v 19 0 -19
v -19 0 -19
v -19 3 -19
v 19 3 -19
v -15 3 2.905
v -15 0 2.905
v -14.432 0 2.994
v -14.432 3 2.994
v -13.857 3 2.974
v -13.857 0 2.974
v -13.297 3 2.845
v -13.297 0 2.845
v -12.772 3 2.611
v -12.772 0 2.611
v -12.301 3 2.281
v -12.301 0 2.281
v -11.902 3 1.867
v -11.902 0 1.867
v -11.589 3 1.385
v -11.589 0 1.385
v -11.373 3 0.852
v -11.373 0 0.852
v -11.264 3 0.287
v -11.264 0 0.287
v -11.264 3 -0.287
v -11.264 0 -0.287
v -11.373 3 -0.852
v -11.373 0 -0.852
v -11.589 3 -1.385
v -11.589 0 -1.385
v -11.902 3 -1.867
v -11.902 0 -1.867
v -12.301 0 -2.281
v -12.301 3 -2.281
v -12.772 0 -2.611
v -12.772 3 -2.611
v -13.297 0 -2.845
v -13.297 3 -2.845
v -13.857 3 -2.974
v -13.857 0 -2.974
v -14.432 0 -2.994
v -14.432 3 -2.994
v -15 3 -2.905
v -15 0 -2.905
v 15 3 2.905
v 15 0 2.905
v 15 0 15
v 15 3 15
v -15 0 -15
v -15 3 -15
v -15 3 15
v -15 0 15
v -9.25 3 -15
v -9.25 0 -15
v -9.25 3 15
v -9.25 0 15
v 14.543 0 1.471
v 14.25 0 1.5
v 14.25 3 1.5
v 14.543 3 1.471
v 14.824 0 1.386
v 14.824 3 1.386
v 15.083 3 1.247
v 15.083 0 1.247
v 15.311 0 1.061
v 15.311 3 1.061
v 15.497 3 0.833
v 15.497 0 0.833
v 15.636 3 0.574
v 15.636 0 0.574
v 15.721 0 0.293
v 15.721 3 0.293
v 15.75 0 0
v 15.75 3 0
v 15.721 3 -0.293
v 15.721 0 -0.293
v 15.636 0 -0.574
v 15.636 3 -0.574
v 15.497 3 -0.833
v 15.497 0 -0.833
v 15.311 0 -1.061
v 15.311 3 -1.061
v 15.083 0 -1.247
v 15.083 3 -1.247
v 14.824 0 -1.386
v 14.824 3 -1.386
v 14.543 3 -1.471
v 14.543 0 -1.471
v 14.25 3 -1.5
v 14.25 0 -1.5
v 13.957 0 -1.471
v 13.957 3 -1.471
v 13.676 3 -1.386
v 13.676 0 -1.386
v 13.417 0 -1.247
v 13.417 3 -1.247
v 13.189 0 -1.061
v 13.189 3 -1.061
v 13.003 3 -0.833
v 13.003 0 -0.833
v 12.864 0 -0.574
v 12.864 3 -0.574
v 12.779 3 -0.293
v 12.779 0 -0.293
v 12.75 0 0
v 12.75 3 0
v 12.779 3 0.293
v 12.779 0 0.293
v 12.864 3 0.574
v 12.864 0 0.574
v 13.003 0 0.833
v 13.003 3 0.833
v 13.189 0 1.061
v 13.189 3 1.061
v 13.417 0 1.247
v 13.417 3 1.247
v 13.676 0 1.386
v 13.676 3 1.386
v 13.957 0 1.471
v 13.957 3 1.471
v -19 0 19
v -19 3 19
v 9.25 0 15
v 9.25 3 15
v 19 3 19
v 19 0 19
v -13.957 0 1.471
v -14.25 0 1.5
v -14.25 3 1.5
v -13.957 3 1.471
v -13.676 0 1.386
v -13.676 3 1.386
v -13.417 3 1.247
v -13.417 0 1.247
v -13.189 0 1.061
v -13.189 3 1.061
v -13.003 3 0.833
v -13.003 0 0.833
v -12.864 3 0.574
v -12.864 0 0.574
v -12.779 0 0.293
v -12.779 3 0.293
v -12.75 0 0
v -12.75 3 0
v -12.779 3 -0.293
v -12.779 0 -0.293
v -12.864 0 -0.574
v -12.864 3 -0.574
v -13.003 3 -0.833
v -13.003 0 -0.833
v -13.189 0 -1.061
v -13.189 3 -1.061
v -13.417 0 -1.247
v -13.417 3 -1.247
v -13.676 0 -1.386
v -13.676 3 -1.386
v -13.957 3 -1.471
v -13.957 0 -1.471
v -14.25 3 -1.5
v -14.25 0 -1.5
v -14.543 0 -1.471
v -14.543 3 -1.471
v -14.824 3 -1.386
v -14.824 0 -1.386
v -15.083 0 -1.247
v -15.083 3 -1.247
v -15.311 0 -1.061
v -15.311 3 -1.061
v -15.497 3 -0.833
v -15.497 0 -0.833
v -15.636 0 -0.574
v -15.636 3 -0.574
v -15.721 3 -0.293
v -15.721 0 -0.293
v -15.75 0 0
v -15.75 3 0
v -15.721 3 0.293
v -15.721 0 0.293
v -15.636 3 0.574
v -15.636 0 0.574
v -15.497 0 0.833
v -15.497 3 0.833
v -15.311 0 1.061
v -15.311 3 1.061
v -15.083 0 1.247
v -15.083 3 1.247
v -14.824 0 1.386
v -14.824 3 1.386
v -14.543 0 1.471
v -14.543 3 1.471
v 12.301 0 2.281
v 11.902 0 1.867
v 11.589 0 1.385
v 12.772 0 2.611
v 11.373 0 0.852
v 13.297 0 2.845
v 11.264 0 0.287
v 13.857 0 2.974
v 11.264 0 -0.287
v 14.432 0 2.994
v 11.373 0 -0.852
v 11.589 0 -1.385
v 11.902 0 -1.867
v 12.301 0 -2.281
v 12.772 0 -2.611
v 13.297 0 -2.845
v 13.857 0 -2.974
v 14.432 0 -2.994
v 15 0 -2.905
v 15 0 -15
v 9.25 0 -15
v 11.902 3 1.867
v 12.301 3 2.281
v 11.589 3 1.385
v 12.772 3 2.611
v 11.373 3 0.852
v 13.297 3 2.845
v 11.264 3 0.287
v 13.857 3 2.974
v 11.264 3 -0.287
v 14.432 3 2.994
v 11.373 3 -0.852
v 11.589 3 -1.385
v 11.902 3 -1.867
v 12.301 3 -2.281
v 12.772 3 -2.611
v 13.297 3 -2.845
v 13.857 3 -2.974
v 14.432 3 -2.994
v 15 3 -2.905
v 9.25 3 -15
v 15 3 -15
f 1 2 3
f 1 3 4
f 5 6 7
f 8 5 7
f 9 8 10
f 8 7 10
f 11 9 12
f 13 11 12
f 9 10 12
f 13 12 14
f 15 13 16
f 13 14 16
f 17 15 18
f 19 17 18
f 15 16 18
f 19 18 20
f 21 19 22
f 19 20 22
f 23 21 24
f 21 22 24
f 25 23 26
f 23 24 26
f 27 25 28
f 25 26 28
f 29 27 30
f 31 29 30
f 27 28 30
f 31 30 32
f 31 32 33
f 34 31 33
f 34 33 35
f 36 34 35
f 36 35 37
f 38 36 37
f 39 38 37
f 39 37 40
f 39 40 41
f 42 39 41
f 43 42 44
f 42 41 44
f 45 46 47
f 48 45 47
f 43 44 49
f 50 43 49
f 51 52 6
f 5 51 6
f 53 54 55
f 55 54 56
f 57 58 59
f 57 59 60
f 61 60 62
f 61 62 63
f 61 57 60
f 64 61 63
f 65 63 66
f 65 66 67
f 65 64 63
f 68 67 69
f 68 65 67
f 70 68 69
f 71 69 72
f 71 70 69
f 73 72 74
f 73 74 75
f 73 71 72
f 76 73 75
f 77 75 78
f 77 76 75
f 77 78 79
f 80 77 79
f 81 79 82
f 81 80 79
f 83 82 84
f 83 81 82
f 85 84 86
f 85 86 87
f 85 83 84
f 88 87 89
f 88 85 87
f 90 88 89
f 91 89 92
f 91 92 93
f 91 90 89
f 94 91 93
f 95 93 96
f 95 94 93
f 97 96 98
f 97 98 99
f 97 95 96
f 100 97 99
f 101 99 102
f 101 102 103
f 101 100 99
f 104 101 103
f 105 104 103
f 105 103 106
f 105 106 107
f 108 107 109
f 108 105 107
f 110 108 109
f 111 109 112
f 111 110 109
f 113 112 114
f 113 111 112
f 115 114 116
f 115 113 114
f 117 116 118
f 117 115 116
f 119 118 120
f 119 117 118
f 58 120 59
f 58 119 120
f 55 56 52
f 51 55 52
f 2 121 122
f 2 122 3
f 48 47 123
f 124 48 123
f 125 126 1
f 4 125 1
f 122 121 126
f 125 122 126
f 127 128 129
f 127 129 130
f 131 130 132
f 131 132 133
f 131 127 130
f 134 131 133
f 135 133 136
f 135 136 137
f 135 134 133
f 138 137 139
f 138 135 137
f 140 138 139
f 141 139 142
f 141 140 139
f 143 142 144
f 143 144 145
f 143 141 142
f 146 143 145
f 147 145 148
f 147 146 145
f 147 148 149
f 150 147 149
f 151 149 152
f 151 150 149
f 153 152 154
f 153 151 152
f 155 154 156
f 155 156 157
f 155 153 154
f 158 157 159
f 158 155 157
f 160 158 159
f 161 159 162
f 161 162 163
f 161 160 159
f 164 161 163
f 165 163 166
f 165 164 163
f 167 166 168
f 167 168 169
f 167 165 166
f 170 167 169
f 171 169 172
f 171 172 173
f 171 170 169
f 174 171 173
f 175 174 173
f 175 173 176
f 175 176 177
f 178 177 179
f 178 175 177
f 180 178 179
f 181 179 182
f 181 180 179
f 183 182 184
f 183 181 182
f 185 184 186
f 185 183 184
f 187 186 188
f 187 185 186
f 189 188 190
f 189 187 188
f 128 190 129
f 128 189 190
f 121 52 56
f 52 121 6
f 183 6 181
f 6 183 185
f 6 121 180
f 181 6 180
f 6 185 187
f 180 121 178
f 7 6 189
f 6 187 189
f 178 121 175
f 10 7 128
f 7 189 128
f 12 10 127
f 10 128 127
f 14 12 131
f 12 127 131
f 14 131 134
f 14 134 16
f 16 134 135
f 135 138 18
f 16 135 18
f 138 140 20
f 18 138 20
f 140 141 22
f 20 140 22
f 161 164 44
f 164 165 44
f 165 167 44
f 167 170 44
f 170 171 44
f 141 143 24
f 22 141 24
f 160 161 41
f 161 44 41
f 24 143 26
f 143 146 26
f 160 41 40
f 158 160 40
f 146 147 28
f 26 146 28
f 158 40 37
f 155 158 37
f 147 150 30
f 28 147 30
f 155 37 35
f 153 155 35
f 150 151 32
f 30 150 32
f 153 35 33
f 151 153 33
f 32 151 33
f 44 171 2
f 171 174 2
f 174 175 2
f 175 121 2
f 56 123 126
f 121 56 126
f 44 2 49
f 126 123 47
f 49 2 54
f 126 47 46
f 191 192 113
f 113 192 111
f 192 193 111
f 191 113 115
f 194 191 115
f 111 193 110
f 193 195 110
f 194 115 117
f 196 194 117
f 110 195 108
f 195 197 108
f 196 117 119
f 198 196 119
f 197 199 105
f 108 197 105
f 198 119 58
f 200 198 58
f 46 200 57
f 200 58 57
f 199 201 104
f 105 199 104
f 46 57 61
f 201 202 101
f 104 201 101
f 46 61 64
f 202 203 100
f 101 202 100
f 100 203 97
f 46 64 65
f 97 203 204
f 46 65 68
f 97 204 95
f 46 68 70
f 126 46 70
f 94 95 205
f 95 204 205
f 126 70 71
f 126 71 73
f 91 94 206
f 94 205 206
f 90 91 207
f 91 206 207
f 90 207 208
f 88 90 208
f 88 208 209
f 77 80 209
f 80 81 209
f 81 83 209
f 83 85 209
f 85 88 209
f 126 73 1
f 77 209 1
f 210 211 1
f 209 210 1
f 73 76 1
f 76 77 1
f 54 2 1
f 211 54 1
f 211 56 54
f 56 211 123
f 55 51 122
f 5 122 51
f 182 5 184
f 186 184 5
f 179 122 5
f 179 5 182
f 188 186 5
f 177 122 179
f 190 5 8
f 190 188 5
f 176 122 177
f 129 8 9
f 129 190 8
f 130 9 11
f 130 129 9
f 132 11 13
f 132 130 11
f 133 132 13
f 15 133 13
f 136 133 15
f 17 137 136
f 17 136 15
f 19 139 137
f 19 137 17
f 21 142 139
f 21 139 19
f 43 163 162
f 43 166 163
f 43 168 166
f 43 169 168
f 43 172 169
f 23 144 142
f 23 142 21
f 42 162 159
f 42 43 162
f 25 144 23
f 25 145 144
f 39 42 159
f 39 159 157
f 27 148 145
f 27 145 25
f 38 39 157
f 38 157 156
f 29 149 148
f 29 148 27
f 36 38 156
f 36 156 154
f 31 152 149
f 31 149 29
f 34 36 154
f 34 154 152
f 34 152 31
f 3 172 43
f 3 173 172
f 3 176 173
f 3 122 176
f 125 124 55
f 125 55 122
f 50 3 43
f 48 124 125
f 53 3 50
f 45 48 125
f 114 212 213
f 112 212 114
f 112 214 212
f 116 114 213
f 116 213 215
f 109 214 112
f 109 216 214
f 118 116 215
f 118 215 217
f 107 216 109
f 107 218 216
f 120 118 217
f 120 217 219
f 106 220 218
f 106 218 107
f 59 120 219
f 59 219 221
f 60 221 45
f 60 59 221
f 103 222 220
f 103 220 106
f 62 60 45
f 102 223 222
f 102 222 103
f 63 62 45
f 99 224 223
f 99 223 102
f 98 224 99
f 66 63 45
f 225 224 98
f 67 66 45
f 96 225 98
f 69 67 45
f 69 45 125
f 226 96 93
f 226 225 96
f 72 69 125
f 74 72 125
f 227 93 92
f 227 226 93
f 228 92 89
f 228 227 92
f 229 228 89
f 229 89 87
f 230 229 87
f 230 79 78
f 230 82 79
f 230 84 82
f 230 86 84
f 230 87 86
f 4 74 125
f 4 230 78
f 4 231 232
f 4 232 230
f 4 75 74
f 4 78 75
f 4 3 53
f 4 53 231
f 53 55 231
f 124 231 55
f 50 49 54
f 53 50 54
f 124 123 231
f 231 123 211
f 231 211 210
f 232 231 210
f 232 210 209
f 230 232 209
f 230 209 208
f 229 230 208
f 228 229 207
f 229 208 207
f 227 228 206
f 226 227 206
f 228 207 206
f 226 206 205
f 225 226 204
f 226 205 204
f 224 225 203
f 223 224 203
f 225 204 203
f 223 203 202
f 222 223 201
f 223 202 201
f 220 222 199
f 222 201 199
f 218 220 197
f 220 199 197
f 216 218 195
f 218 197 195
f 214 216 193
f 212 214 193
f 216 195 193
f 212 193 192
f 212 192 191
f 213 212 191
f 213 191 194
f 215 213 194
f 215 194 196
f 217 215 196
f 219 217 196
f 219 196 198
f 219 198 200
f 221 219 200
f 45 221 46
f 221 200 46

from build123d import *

# Parameters (mm, degrees)
SKETCH1_W           = 38
SKETCH1_H           = 38
SKETCH1_R           = 1.5
BOSS_EXTRUDE1_DEPTH = 3


with BuildPart() as part:
    # Sketch1 → Boss-Extrude1 (new body)
    with BuildSketch(Plane(origin=(0, 0, 0), x_dir=(1, 0, 0), z_dir=(0, 1, 0))):
        Rectangle(SKETCH1_W, SKETCH1_H)
        with BuildLine():
            ThreePointArc((-15, -2.90473751), (-11.25, 0), (-15, 2.90473751))
            Line((-15, 2.90473751), (-15, 15))
            Line((-15, 15), (-9.25, 15))
            Line((-9.25, 15), (-9.25, -15))
            Line((-9.25, -15), (-15, -15))
            Line((-15, -15), (-15, -2.90473751))
        make_face(mode=Mode.SUBTRACT)
        with Locations(Location((-14.25, 0, 0), (0, 0, 270))):
            Circle(SKETCH1_R, mode=Mode.SUBTRACT)
        with BuildLine():
            Line((15, -15), (9.25, -15))
            Line((9.25, -15), (9.25, 15))
            Line((9.25, 15), (15, 15))
            Line((15, 15), (15, 2.90473751))
            ThreePointArc((15, 2.90473751), (11.25, 0), (15, -2.90473751))
            Line((15, -2.90473751), (15, -15))
        make_face(mode=Mode.SUBTRACT)
        with Locations(Location((14.25, 0, 0), (0, 0, 270))):
            Circle(SKETCH1_R, mode=Mode.SUBTRACT)
    extrude(amount=BOSS_EXTRUDE1_DEPTH)


solid = part.part
